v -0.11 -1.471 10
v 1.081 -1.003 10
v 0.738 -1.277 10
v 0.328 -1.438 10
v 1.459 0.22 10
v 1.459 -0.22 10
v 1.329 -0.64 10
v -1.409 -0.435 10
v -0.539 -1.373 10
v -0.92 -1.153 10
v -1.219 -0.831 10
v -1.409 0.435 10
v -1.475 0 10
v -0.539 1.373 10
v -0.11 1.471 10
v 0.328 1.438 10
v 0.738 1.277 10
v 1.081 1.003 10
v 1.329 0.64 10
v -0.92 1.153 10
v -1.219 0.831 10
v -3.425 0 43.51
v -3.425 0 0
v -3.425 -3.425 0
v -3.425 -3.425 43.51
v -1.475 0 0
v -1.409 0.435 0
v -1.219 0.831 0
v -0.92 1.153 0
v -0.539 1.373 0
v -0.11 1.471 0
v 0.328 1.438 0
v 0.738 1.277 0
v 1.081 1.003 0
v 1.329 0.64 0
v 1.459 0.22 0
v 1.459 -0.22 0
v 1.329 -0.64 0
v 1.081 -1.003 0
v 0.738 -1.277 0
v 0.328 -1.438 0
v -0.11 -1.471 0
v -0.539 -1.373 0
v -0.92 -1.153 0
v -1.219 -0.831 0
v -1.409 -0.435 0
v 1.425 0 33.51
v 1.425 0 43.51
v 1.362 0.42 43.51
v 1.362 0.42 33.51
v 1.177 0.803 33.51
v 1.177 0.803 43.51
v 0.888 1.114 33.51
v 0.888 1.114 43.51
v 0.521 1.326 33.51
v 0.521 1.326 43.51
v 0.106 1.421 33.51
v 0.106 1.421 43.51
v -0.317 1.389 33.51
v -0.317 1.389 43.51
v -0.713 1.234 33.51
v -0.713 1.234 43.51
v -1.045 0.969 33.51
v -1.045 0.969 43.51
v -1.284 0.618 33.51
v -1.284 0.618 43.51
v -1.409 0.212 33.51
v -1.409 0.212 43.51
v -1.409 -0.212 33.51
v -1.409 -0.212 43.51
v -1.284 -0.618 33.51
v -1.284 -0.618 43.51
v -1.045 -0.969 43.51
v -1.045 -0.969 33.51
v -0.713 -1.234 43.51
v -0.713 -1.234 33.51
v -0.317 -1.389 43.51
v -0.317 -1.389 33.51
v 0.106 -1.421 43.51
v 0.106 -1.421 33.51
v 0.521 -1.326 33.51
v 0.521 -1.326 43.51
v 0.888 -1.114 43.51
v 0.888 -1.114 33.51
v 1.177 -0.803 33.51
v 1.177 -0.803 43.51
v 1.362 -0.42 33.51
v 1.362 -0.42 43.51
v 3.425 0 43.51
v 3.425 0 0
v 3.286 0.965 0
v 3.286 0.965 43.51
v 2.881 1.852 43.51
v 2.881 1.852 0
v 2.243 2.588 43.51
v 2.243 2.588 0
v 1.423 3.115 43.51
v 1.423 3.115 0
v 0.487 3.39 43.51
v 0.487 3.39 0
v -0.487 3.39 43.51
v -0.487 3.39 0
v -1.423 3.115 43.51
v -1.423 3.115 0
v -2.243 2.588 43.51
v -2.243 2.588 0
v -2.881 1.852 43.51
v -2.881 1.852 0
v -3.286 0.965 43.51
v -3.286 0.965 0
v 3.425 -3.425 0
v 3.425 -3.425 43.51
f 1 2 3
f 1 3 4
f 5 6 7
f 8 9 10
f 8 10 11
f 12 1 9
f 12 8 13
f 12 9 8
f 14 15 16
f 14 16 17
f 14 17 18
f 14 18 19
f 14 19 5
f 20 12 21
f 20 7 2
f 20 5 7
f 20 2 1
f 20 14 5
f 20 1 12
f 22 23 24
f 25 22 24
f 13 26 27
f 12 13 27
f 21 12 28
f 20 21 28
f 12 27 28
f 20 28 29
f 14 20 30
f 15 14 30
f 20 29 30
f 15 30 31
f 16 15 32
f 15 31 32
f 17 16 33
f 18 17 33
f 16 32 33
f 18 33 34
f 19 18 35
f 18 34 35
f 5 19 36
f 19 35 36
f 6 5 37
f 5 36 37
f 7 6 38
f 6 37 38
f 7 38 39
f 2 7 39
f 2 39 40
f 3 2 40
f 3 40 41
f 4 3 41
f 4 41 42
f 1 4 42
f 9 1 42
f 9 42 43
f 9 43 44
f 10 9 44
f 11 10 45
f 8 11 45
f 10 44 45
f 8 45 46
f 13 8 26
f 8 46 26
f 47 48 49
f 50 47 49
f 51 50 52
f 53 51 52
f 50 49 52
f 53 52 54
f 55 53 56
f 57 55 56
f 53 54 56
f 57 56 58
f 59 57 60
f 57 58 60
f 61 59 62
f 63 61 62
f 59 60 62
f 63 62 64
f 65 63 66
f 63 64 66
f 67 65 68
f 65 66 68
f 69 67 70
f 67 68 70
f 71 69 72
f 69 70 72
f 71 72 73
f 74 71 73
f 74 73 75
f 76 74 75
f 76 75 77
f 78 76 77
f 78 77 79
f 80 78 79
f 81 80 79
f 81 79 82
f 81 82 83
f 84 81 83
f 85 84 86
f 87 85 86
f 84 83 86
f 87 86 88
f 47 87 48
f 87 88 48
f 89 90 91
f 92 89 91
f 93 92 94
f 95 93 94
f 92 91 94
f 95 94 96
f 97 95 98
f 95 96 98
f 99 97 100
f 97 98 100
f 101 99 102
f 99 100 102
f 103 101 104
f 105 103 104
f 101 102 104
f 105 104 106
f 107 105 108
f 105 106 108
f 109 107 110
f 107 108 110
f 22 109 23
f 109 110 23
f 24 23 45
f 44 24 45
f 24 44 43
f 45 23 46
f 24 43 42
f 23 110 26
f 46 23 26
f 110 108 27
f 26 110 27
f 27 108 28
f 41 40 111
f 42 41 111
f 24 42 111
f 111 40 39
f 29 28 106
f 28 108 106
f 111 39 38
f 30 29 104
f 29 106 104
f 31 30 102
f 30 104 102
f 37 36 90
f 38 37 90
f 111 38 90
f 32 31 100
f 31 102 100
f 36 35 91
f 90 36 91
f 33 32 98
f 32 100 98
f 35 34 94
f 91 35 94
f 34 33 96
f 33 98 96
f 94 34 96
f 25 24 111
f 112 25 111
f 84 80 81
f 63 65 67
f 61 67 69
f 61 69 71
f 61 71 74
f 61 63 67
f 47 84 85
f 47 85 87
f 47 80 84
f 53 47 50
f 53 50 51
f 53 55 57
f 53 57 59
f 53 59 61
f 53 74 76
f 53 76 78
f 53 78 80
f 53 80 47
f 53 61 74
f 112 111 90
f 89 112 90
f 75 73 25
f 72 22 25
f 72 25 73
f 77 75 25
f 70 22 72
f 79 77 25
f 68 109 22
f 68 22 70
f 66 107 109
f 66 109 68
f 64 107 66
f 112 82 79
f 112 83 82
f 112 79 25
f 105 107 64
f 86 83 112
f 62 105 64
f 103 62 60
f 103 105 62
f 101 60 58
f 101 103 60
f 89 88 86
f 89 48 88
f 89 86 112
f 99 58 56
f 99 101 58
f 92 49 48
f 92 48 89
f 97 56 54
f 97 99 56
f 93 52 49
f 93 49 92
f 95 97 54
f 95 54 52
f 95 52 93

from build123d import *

# Parameters (mm, degrees)
SKETCH1_R           = 3.425
BOSS_EXTRUDE1_DEPTH = 43.5096
SKETCH2_R           = 1.475
CUT_EXTRUDE1_DEPTH  = 10
SKETCH3_R           = 1.425
CUT_EXTRUDE2_DEPTH  = 10
BOSS_EXTRUDE2_START = -43.5096
BOSS_EXTRUDE2_DEPTH = 43.5096


with BuildPart() as part:
    # Sketch1 → Boss-Extrude1 (new body)
    with BuildSketch(Plane.XY):
        Circle(SKETCH1_R)
    extrude(amount=BOSS_EXTRUDE1_DEPTH)

    # Sketch2 → Cut-Extrude1 (cut)
    with BuildSketch(Plane(origin=(0, 0, 0), x_dir=(-1, 0, 0), z_dir=(0, 0, -1))):
        Circle(SKETCH2_R)
    extrude(amount=-CUT_EXTRUDE1_DEPTH, mode=Mode.SUBTRACT)

    # Sketch3 → Cut-Extrude2 (cut)
    with BuildSketch(Plane.XY.offset(43.5096)):
        Circle(SKETCH3_R)
    extrude(amount=-CUT_EXTRUDE2_DEPTH, mode=Mode.SUBTRACT)

    # Sketch4 → Boss-Extrude2 (add)
    with BuildSketch(Plane.XY.offset(43.5096).offset(BOSS_EXTRUDE2_START)):
        with BuildLine():
            Line((-3.425, -3.425), (0, -3.425))
            ThreePointArc((0, -3.425), (-2.421840726, -2.421840726), (-3.425, 0))
            Line((-3.425, 0), (-3.425, -3.425))
        make_face()
        with BuildLine():
            ThreePointArc((3.425, 0), (2.421840726, -2.421840726), (0, -3.425))
            Line((0, -3.425), (1.146126532, -3.425))
            Line((1.146126532, -3.425), (3.425, -3.425))
            Line((3.425, -3.425), (3.425, 0))
        make_face()
    extrude(amount=BOSS_EXTRUDE2_DEPTH)


solid = part.part
